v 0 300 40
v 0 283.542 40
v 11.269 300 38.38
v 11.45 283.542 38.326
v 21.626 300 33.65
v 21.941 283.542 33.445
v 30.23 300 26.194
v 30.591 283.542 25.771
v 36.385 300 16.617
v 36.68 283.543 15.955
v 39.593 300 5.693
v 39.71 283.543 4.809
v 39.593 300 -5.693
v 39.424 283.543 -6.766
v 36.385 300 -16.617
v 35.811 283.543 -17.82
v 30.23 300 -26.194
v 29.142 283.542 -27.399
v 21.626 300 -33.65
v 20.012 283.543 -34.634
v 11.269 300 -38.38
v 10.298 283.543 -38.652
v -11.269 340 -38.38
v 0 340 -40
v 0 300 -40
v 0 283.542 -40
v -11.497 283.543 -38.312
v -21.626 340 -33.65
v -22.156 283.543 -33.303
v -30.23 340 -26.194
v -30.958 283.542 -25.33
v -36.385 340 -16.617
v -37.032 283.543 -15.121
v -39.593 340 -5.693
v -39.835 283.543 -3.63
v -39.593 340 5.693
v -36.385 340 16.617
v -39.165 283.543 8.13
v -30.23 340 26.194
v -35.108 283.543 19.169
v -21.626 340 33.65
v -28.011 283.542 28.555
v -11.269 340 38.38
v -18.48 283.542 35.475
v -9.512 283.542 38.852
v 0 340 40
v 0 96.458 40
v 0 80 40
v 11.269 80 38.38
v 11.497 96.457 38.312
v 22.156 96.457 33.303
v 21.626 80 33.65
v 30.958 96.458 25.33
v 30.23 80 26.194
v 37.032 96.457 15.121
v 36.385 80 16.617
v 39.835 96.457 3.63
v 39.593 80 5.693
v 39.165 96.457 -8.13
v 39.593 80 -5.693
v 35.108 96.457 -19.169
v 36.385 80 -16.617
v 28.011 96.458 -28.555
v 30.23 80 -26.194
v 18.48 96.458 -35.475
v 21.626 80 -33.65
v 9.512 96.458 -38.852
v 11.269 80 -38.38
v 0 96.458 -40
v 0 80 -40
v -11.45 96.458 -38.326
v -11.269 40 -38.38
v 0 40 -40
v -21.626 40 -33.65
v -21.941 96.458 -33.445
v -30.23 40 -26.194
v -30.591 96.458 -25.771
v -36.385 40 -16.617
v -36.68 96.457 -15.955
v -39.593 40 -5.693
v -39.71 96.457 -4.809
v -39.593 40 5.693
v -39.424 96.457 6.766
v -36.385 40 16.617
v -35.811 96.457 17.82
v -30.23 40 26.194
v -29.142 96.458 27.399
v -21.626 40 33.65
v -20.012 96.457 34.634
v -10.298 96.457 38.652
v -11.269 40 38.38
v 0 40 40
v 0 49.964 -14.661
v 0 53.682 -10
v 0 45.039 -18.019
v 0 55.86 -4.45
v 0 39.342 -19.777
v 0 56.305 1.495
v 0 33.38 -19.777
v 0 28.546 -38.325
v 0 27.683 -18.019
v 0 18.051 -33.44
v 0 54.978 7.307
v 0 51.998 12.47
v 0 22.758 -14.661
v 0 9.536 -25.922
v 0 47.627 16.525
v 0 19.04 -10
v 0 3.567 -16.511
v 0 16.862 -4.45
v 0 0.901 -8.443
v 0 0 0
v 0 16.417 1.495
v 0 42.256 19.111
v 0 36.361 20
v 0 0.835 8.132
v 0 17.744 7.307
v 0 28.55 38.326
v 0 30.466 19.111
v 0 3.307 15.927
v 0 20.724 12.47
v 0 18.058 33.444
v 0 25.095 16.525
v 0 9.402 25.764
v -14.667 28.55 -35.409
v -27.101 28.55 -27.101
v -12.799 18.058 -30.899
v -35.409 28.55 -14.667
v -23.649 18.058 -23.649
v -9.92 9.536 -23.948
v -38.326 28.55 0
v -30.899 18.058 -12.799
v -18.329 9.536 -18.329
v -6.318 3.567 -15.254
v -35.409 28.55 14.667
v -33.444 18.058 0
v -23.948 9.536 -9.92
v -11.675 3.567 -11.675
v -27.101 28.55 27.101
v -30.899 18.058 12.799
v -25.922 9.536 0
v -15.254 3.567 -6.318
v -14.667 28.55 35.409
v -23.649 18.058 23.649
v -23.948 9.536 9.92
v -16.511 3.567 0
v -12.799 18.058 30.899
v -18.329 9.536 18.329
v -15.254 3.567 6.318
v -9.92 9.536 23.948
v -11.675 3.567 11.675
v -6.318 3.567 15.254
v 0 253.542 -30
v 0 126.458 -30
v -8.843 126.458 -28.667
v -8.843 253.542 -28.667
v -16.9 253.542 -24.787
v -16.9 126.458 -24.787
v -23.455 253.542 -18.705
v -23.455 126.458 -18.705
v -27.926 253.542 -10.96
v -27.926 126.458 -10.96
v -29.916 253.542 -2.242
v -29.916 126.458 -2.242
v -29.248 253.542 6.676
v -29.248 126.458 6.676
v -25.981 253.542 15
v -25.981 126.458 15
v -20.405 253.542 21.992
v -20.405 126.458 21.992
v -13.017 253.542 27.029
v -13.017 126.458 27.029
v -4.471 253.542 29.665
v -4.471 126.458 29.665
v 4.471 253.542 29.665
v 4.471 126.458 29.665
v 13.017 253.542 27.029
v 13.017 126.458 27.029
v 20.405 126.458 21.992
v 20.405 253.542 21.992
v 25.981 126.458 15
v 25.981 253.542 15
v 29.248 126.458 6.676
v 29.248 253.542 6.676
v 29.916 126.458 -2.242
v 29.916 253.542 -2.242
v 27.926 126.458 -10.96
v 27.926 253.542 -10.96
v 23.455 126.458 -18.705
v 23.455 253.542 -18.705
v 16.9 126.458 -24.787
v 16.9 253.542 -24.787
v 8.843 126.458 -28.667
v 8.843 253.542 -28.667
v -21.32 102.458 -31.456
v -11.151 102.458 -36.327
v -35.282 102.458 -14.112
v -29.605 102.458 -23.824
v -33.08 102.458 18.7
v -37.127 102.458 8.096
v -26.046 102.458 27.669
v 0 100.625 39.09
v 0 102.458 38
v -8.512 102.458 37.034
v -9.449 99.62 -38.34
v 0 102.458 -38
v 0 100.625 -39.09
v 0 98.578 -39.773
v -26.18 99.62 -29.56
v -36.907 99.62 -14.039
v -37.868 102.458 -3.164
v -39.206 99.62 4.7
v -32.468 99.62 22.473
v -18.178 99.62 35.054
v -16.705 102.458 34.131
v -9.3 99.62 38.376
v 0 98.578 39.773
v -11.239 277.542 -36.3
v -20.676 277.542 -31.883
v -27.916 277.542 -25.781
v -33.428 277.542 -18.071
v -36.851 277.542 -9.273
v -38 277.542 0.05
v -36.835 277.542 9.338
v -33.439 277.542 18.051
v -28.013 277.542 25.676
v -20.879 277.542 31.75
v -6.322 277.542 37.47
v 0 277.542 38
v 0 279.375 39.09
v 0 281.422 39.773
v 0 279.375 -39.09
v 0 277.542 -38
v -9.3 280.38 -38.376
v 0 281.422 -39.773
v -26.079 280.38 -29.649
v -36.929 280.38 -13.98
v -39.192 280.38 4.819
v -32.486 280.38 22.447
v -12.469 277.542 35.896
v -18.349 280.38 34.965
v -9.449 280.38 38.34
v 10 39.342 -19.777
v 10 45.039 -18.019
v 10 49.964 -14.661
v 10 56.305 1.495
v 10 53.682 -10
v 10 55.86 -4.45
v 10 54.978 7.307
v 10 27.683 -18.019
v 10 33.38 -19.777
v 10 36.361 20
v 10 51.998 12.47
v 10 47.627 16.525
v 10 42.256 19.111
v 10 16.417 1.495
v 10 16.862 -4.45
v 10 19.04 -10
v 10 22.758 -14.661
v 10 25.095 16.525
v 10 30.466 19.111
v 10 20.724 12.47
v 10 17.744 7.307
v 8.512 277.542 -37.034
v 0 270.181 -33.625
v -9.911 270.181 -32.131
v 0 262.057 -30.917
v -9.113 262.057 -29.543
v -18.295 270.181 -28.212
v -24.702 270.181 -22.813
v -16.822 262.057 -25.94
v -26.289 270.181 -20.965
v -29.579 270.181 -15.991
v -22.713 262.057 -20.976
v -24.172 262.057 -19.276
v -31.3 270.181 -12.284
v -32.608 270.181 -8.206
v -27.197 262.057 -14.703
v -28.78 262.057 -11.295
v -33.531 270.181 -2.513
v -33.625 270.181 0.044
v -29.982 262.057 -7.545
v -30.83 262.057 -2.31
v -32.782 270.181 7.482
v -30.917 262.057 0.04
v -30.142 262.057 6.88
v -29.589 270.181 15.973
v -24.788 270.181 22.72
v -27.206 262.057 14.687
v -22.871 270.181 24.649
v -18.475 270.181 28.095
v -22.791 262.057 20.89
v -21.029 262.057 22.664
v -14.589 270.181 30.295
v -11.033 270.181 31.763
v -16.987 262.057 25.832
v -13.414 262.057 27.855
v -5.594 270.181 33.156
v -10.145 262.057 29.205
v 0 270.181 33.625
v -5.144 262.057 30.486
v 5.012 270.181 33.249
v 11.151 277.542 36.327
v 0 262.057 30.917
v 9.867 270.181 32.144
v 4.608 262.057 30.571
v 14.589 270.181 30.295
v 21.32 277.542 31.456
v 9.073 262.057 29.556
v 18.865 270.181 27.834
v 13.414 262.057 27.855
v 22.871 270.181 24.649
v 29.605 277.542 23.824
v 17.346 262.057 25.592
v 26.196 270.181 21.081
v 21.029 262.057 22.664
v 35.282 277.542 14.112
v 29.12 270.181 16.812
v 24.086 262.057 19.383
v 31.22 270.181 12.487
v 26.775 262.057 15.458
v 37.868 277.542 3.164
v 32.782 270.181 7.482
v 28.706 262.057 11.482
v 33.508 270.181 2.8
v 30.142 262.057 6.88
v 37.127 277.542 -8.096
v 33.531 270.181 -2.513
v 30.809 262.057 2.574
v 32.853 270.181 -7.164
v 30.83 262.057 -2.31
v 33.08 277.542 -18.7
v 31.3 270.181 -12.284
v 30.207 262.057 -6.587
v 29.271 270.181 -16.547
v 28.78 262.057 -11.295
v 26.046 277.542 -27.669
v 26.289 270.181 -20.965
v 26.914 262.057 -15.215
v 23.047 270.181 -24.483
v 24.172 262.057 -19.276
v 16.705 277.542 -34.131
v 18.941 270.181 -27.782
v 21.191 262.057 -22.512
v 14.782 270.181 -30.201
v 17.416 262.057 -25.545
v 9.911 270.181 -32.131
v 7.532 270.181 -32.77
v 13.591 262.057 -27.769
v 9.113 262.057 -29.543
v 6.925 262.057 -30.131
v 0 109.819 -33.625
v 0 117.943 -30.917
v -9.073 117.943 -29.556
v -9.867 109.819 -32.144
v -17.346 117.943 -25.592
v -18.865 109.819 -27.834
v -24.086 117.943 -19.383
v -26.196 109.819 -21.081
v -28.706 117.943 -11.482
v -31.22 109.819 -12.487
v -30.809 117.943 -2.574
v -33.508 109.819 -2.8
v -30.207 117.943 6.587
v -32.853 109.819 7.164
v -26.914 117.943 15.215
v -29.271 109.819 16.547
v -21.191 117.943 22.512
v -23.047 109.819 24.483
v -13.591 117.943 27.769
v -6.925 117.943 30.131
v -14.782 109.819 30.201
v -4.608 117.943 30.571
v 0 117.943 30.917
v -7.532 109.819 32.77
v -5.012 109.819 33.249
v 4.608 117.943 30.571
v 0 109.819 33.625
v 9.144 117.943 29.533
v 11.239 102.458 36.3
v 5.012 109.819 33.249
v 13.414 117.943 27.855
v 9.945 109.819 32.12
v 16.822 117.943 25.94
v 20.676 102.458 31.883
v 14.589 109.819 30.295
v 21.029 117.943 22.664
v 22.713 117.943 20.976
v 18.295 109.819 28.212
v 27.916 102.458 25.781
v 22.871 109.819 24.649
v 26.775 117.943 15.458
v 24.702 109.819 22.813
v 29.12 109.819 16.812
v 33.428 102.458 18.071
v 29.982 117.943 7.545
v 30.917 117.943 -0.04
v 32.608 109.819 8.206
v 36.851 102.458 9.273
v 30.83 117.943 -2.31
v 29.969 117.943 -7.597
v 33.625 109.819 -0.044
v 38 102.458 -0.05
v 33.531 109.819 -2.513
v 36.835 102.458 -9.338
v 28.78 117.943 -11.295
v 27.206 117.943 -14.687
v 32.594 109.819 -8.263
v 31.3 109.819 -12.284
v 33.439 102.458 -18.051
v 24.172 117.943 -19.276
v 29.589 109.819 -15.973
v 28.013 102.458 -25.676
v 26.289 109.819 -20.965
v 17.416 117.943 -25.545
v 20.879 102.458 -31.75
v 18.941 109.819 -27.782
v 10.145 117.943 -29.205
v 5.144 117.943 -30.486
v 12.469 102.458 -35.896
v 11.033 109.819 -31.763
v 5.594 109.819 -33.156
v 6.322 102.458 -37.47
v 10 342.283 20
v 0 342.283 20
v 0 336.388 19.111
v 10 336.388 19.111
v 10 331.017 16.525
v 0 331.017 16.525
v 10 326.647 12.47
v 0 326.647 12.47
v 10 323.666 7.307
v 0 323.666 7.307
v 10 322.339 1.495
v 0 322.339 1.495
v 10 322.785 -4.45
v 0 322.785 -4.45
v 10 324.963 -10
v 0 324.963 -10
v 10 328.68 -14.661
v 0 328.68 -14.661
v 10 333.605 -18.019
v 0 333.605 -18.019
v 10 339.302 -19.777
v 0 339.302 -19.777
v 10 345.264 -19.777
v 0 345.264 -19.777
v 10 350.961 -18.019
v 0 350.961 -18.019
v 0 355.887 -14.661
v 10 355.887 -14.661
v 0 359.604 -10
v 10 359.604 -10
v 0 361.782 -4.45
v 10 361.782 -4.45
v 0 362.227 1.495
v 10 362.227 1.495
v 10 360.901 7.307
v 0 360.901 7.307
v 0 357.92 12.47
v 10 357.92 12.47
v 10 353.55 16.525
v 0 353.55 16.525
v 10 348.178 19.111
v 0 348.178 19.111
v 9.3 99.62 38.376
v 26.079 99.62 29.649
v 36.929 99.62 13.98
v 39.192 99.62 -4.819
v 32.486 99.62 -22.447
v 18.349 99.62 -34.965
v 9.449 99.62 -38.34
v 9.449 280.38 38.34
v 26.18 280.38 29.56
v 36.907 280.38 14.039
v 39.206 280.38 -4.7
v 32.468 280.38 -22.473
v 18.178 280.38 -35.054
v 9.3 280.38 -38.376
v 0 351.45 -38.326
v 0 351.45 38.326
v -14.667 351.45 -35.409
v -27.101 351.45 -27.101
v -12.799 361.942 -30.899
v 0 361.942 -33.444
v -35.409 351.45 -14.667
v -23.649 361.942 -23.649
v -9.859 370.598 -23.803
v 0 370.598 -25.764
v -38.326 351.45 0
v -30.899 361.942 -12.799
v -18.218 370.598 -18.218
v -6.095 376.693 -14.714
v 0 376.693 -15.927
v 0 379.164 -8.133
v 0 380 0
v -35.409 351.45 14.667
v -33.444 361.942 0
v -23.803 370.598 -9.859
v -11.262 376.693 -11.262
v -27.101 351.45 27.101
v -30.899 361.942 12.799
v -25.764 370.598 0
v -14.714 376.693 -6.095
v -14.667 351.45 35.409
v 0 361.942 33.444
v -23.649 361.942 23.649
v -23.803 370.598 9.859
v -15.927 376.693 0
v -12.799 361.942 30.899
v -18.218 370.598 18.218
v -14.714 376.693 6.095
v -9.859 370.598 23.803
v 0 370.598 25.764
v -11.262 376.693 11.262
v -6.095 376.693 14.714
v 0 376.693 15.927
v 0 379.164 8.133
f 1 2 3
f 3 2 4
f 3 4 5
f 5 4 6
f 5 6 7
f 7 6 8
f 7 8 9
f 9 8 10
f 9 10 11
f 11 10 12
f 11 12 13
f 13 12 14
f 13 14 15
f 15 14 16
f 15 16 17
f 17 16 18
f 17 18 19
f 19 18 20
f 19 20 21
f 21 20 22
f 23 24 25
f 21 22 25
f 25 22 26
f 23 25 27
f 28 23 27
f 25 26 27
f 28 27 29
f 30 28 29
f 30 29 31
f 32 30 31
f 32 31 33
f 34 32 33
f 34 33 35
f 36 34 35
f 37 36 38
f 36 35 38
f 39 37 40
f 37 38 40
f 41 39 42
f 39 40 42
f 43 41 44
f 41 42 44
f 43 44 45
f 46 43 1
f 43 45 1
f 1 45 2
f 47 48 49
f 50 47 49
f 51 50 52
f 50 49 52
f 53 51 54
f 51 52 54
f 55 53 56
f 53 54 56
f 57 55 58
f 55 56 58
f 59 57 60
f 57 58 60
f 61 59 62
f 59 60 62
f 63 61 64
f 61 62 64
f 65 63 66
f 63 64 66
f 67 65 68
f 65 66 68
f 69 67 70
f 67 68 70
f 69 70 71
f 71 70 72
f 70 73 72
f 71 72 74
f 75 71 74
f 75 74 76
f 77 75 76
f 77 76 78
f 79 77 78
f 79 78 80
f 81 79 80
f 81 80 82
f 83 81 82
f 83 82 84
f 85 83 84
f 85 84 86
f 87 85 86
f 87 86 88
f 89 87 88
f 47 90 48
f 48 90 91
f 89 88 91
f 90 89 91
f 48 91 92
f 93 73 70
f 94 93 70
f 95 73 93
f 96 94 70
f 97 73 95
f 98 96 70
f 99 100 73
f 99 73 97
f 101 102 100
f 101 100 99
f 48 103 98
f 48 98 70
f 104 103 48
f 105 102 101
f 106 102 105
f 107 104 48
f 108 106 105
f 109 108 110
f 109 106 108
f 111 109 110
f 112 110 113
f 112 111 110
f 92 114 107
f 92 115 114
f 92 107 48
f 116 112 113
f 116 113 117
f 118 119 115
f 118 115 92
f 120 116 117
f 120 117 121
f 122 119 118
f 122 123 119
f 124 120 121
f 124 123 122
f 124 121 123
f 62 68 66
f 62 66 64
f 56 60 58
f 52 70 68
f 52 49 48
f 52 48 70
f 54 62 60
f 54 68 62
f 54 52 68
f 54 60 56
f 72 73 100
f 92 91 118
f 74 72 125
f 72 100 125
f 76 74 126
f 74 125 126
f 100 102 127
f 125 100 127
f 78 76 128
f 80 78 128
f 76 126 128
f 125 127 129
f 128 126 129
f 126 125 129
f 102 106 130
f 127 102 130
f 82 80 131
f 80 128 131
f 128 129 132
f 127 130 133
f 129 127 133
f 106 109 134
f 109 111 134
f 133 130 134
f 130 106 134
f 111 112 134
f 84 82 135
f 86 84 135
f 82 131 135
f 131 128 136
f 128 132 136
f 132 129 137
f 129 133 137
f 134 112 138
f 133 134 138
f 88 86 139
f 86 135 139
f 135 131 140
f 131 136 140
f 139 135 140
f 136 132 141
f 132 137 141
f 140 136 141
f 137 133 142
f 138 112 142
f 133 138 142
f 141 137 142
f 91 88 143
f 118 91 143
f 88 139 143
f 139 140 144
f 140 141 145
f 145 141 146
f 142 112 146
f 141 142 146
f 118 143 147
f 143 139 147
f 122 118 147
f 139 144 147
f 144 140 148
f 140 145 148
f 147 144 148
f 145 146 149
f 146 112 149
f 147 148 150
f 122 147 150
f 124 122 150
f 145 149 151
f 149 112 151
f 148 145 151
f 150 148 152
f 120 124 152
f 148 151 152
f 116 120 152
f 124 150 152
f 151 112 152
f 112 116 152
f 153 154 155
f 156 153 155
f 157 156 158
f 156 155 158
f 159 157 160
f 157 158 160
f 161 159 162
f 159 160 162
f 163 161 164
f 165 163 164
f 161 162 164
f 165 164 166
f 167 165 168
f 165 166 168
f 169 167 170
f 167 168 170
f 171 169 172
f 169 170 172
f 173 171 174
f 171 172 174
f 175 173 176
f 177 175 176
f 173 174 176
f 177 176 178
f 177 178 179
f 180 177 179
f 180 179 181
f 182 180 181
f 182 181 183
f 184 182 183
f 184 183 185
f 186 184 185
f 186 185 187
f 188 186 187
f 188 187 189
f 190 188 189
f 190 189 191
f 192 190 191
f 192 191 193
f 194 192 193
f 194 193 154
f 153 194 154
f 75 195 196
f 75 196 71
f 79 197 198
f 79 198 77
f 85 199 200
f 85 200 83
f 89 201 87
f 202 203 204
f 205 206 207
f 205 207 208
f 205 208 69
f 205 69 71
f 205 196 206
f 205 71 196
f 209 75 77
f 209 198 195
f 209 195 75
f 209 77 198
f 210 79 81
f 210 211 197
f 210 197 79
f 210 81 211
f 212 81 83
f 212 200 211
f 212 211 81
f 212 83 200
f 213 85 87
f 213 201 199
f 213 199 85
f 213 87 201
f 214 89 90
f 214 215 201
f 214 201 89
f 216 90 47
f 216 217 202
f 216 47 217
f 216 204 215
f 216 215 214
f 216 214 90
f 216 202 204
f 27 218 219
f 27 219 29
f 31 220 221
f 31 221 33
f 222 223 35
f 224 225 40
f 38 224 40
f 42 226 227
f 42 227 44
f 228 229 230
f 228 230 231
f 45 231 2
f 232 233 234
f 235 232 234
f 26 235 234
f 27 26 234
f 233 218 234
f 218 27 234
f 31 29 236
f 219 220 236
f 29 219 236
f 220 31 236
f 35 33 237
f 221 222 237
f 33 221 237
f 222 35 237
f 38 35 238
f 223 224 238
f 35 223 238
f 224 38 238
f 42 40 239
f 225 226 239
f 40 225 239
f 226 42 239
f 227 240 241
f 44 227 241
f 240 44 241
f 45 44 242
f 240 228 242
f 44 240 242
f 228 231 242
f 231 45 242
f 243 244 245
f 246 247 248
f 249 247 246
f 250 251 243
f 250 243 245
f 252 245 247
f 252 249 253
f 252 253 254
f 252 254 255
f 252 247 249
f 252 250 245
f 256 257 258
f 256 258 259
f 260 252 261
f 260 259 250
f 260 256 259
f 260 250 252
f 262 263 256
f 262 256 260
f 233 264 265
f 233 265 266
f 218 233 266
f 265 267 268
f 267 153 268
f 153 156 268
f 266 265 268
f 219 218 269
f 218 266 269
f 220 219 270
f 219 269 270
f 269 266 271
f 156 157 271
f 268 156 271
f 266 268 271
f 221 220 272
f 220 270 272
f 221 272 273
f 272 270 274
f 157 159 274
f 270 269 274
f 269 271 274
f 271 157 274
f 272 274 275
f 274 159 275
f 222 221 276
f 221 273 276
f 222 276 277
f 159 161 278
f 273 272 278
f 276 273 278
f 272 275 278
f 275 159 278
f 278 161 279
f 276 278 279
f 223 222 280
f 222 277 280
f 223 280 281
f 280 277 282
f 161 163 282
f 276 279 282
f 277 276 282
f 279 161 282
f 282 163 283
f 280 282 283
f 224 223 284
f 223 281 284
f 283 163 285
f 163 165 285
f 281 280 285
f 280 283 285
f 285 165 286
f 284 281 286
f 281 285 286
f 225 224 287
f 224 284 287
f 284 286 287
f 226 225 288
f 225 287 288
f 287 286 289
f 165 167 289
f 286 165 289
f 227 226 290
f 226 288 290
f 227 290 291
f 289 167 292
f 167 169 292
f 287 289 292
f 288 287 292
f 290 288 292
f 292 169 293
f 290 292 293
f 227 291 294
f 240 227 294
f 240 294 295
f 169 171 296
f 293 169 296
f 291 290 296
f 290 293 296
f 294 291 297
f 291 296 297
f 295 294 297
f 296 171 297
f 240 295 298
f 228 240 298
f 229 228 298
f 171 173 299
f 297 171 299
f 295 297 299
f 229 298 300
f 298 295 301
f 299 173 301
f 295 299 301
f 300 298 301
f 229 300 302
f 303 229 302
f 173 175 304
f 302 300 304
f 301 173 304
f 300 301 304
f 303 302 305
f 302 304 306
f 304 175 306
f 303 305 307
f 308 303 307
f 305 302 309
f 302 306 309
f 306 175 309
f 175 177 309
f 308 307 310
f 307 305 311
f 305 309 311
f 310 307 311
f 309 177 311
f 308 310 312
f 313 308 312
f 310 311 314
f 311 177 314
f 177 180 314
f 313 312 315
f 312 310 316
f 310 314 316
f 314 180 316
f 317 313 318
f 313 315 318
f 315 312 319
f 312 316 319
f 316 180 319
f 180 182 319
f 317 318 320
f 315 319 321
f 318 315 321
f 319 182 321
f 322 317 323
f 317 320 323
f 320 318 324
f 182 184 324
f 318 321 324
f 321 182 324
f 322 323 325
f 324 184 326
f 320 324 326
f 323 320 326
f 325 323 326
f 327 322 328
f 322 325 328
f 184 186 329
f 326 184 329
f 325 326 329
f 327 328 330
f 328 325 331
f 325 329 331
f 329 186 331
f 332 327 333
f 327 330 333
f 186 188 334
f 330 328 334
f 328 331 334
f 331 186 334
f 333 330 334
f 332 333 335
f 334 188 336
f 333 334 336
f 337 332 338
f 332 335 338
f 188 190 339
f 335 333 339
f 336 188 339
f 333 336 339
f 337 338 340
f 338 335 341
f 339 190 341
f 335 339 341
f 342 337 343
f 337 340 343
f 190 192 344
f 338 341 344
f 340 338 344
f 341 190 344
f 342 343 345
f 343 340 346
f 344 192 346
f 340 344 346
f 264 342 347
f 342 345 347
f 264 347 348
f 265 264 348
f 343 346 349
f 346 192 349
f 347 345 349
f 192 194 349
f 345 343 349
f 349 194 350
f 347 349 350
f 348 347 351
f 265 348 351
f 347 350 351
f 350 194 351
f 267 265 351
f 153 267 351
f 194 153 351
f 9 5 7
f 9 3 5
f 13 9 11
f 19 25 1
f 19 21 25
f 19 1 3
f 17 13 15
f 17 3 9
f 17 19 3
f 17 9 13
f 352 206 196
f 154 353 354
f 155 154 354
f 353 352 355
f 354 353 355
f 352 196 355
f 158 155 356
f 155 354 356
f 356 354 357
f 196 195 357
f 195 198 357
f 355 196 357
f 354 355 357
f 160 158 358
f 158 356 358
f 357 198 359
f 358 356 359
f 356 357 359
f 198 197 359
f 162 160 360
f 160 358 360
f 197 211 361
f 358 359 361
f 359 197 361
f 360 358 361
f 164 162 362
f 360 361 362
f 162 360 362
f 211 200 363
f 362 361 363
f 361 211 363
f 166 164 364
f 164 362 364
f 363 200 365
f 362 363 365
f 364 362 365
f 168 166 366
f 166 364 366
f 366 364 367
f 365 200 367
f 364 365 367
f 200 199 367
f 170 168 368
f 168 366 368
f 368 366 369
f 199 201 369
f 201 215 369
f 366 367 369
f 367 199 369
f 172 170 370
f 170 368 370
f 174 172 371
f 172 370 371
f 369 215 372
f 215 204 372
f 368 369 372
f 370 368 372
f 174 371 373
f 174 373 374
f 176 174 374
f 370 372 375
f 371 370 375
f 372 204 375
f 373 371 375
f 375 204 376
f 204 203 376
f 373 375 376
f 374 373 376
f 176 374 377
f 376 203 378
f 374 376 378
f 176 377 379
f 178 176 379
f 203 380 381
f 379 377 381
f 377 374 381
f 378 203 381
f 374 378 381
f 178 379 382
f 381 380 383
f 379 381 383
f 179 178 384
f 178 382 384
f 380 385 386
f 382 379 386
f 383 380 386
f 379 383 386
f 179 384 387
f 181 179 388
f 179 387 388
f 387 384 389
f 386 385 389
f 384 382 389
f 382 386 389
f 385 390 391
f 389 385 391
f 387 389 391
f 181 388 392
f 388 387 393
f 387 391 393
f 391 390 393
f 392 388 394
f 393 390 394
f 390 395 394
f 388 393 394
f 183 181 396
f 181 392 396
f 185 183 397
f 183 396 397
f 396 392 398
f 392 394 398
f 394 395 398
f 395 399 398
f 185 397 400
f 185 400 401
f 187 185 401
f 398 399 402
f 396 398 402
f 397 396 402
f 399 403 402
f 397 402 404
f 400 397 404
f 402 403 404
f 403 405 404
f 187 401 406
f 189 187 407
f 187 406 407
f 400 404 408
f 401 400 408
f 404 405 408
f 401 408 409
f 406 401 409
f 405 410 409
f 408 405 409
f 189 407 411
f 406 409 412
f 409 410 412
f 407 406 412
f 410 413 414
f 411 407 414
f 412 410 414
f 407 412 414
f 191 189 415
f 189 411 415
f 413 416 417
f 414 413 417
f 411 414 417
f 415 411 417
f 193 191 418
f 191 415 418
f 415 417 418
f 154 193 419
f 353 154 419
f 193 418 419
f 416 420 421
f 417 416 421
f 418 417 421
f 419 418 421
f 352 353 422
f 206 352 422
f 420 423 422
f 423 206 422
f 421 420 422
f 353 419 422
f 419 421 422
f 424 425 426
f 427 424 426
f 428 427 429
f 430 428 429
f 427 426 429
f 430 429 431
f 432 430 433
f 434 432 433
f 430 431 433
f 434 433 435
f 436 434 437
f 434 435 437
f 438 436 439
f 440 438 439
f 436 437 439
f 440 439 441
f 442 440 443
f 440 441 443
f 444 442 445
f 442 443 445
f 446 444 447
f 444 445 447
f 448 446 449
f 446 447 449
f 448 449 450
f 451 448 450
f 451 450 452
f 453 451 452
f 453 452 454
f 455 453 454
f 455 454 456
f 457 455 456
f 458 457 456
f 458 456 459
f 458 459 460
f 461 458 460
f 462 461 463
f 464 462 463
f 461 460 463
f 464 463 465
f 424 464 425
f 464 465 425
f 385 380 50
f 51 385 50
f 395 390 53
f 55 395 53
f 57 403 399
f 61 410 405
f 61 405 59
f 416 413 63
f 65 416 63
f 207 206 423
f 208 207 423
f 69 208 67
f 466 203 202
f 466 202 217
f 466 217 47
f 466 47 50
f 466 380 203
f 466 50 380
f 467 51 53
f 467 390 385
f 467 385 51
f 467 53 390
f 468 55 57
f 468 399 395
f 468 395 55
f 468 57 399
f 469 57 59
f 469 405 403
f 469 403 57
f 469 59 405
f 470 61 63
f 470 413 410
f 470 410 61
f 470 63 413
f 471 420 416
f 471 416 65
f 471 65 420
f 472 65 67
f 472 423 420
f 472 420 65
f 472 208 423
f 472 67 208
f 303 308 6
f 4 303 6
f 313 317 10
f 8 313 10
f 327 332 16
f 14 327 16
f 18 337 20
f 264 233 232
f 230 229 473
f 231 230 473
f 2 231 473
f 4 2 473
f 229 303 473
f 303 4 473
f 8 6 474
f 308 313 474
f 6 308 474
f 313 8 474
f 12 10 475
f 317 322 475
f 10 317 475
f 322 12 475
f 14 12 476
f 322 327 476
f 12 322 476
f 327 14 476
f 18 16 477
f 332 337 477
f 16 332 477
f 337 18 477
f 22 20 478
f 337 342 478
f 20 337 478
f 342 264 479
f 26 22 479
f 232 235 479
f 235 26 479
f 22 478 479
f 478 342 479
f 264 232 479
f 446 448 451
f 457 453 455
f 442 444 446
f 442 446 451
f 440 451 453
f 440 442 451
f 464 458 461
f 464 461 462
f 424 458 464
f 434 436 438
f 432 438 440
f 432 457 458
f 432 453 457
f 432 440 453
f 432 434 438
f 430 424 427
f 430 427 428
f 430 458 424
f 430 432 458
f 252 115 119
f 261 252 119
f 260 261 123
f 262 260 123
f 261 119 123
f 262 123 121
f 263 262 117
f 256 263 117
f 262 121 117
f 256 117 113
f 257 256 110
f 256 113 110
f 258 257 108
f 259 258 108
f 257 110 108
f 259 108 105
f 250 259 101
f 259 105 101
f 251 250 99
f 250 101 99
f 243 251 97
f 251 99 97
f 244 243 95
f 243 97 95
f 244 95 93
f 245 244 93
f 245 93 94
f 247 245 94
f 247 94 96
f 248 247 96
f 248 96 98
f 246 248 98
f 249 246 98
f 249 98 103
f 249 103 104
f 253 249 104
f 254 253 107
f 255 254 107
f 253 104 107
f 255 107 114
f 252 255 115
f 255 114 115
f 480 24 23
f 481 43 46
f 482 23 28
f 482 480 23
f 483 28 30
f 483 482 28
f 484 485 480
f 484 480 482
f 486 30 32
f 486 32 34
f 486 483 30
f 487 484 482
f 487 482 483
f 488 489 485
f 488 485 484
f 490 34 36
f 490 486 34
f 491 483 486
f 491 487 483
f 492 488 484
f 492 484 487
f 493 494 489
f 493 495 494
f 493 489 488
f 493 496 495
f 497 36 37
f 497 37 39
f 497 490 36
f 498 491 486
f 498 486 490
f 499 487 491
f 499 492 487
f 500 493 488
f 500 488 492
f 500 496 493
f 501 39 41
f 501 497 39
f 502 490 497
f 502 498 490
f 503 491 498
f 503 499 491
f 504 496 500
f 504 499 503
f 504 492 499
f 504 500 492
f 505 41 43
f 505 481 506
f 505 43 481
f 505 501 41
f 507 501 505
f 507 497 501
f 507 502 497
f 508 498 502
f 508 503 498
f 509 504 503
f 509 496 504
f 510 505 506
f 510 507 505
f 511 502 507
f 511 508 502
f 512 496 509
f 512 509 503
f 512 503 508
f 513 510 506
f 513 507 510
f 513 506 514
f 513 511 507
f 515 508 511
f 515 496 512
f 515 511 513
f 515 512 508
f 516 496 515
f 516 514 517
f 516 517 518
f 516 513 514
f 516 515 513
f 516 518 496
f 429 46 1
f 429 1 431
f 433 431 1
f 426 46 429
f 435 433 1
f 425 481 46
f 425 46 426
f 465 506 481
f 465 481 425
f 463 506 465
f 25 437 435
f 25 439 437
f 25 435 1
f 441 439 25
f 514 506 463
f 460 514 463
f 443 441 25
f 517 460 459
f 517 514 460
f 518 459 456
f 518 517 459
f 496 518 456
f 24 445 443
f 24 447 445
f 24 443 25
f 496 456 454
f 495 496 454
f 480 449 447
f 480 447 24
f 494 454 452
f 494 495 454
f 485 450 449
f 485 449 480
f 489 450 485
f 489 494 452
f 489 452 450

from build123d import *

# Parameters (mm, degrees)
SKETCH1_R           = 40
BOSS_EXTRUDE1_DEPTH = 100
SKETCH3_R           = 30
BOSS_EXTRUDE2_DEPTH = 180
SKETCH4_R           = 40
BOSS_EXTRUDE3_DEPTH = 100
SKETCH5_W           = 41.242816752
SKETCH5_H           = 81.516639277
CUT_EXTRUDE1_DEPTH  = 80
SKETCH6_W           = 41.962077935
SKETCH6_H           = 81.514478353
CUT_EXTRUDE2_DEPTH  = 80
FILLET3_R           = 40
FILLET4_R           = 40
SKETCH7_R           = 20
BOSS_EXTRUDE4_DEPTH = 10
SKETCH8_R           = 20
BOSS_EXTRUDE5_DEPTH = 10
FILLET5_R           = 40
FILLET6_R           = 40
FILLET7_R           = 10
FILLET8_R           = 10


# Some blends are built 0.0001 mm under size
with BuildPart() as part:
    # Sketch1 → Boss-Extrude1 (new body)
    with BuildSketch(Plane(origin=(0, 0, 0), x_dir=(1, 0, 0), z_dir=(0, 1, 0))):
        with Locations(Location((0, 0, 0), (0, 0, 270))):
            Circle(SKETCH1_R)
    extrude(amount=BOSS_EXTRUDE1_DEPTH)

    # Sketch3 → Boss-Extrude2 (add)
    with BuildSketch(Plane(origin=(0, 100, 0), x_dir=(1, 0, 0), z_dir=(0, 1, 0))):
        with Locations(Location((0, 0, 0), (0, 0, 90))):
            Circle(SKETCH3_R)
    extrude(amount=BOSS_EXTRUDE2_DEPTH)

    # Sketch4 → Boss-Extrude3 (add)
    with BuildSketch(Plane(origin=(0, 280, 0), x_dir=(1, 0, 0), z_dir=(0, 1, 0))):
        with Locations(Location((0, 0, 0), (0, 0, 270))):
            Circle(SKETCH4_R)
    extrude(amount=BOSS_EXTRUDE3_DEPTH)

    # Sketch5 → Cut-Extrude1 (cut)
    with BuildSketch(Plane(origin=(0, 380, 0), x_dir=(1, 0, 0), z_dir=(0, 1, 0))):
        with Locations((20.621408376, 0.242248556)):
            Rectangle(SKETCH5_W, SKETCH5_H)
    extrude(amount=-CUT_EXTRUDE1_DEPTH, mode=Mode.SUBTRACT)

    # Sketch6 → Cut-Extrude2 (cut)
    with BuildSketch(Plane.XZ):
        with Locations((20.981038968, -0.067313451)):
            Rectangle(SKETCH6_W, SKETCH6_H)
    extrude(amount=-CUT_EXTRUDE2_DEPTH, mode=Mode.SUBTRACT)

    # Fillet3
    fillet3_edges = [part.edges().sort_by_distance(p)[0] for p in [
        (-40, 0, 0),
    ]]
    fillet(fillet3_edges, radius=FILLET3_R - 0.0001)  # a hair under: the kernel refuses the full size

    # Fillet4
    fillet4_edges = [part.edges().sort_by_distance(p)[0] for p in [
        (-40, 380, 0),
    ]]
    fillet(fillet4_edges, radius=FILLET4_R - 0.0001)  # a hair under: the kernel refuses the full size

    # Sketch7 → Boss-Extrude4 (add)
    with BuildSketch(Plane(origin=(0, 0, 0), x_dir=(0, 0, -1), z_dir=(1, 0, 0))):
        with Locations(Location((0, 36.360995044, 0), (0, 0, 180))):
            Circle(SKETCH7_R)
    extrude(amount=BOSS_EXTRUDE4_DEPTH)

    # Sketch8 → Boss-Extrude5 (add)
    with BuildSketch(Plane(origin=(0, 0, 0), x_dir=(0, 0, -1), z_dir=(1, 0, 0))):
        with Locations(Location((0, 342.283138074, 0), (0, 0, 180))):
            Circle(SKETCH8_R)
    extrude(amount=BOSS_EXTRUDE5_DEPTH)

    # Fillet5
    # the kernel refuses this fillet: 40 mm, written as the material it adds along each edge
    with BuildSketch(Plane(origin=(0, 100, 0), x_dir=(0, 0, -1), z_dir=(1, 0, 0))) as fillet5_piece_1:
        with BuildLine():
            CenterArc((70, 26.457513111), FILLET5_R, 180, 41.409622109)
            Line((40, 0), (39.4, -0.529150262))
            ThreePointArc((39.4, -0.529150262), (35, -0.8), (30, -0.8))
            Line((30, -0.8), (29.2, 0))
            Line((29.2, 0), (29.2, 26.457513111))
            Line((29.2, 26.457513111), (30, 26.457513111))
        make_face()
    revolve(axis=Axis((0, 100, 0), (0, 1, 0)))

    # Fillet6
    # the kernel refuses this fillet: 40 mm, written as the material it adds along each edge
    with BuildSketch(Plane(origin=(0, 280, 0), x_dir=(0, 0, -1), z_dir=(1, 0, 0))) as fillet6_piece_1:
        with BuildLine():
            CenterArc((70, -26.457513111), FILLET6_R, 138.590377891, 41.409622109)
            Line((40, 0), (39.4, 0.529150262))
            ThreePointArc((39.4, 0.529150262), (35, 0.8), (30, 0.8))
            Line((30, 0.8), (29.2, 0))
            Line((29.2, 0), (29.2, -26.457513111))
            Line((29.2, -26.457513111), (30, -26.457513111))
        make_face()
    revolve(axis=Axis((0, 280, 0), (0, 1, 0)))

    # Fillet7
    fillet7_edges = [part.edges().sort_by_distance(p)[0] for p in [
        (40, 280, 0),
    ]]
    fillet(fillet7_edges, radius=FILLET7_R)

    # Fillet8
    fillet8_edges = [part.edges().sort_by_distance(p)[0] for p in [
        (-40, 100, 0),
    ]]
    fillet(fillet8_edges, radius=FILLET8_R)


solid = part.part
